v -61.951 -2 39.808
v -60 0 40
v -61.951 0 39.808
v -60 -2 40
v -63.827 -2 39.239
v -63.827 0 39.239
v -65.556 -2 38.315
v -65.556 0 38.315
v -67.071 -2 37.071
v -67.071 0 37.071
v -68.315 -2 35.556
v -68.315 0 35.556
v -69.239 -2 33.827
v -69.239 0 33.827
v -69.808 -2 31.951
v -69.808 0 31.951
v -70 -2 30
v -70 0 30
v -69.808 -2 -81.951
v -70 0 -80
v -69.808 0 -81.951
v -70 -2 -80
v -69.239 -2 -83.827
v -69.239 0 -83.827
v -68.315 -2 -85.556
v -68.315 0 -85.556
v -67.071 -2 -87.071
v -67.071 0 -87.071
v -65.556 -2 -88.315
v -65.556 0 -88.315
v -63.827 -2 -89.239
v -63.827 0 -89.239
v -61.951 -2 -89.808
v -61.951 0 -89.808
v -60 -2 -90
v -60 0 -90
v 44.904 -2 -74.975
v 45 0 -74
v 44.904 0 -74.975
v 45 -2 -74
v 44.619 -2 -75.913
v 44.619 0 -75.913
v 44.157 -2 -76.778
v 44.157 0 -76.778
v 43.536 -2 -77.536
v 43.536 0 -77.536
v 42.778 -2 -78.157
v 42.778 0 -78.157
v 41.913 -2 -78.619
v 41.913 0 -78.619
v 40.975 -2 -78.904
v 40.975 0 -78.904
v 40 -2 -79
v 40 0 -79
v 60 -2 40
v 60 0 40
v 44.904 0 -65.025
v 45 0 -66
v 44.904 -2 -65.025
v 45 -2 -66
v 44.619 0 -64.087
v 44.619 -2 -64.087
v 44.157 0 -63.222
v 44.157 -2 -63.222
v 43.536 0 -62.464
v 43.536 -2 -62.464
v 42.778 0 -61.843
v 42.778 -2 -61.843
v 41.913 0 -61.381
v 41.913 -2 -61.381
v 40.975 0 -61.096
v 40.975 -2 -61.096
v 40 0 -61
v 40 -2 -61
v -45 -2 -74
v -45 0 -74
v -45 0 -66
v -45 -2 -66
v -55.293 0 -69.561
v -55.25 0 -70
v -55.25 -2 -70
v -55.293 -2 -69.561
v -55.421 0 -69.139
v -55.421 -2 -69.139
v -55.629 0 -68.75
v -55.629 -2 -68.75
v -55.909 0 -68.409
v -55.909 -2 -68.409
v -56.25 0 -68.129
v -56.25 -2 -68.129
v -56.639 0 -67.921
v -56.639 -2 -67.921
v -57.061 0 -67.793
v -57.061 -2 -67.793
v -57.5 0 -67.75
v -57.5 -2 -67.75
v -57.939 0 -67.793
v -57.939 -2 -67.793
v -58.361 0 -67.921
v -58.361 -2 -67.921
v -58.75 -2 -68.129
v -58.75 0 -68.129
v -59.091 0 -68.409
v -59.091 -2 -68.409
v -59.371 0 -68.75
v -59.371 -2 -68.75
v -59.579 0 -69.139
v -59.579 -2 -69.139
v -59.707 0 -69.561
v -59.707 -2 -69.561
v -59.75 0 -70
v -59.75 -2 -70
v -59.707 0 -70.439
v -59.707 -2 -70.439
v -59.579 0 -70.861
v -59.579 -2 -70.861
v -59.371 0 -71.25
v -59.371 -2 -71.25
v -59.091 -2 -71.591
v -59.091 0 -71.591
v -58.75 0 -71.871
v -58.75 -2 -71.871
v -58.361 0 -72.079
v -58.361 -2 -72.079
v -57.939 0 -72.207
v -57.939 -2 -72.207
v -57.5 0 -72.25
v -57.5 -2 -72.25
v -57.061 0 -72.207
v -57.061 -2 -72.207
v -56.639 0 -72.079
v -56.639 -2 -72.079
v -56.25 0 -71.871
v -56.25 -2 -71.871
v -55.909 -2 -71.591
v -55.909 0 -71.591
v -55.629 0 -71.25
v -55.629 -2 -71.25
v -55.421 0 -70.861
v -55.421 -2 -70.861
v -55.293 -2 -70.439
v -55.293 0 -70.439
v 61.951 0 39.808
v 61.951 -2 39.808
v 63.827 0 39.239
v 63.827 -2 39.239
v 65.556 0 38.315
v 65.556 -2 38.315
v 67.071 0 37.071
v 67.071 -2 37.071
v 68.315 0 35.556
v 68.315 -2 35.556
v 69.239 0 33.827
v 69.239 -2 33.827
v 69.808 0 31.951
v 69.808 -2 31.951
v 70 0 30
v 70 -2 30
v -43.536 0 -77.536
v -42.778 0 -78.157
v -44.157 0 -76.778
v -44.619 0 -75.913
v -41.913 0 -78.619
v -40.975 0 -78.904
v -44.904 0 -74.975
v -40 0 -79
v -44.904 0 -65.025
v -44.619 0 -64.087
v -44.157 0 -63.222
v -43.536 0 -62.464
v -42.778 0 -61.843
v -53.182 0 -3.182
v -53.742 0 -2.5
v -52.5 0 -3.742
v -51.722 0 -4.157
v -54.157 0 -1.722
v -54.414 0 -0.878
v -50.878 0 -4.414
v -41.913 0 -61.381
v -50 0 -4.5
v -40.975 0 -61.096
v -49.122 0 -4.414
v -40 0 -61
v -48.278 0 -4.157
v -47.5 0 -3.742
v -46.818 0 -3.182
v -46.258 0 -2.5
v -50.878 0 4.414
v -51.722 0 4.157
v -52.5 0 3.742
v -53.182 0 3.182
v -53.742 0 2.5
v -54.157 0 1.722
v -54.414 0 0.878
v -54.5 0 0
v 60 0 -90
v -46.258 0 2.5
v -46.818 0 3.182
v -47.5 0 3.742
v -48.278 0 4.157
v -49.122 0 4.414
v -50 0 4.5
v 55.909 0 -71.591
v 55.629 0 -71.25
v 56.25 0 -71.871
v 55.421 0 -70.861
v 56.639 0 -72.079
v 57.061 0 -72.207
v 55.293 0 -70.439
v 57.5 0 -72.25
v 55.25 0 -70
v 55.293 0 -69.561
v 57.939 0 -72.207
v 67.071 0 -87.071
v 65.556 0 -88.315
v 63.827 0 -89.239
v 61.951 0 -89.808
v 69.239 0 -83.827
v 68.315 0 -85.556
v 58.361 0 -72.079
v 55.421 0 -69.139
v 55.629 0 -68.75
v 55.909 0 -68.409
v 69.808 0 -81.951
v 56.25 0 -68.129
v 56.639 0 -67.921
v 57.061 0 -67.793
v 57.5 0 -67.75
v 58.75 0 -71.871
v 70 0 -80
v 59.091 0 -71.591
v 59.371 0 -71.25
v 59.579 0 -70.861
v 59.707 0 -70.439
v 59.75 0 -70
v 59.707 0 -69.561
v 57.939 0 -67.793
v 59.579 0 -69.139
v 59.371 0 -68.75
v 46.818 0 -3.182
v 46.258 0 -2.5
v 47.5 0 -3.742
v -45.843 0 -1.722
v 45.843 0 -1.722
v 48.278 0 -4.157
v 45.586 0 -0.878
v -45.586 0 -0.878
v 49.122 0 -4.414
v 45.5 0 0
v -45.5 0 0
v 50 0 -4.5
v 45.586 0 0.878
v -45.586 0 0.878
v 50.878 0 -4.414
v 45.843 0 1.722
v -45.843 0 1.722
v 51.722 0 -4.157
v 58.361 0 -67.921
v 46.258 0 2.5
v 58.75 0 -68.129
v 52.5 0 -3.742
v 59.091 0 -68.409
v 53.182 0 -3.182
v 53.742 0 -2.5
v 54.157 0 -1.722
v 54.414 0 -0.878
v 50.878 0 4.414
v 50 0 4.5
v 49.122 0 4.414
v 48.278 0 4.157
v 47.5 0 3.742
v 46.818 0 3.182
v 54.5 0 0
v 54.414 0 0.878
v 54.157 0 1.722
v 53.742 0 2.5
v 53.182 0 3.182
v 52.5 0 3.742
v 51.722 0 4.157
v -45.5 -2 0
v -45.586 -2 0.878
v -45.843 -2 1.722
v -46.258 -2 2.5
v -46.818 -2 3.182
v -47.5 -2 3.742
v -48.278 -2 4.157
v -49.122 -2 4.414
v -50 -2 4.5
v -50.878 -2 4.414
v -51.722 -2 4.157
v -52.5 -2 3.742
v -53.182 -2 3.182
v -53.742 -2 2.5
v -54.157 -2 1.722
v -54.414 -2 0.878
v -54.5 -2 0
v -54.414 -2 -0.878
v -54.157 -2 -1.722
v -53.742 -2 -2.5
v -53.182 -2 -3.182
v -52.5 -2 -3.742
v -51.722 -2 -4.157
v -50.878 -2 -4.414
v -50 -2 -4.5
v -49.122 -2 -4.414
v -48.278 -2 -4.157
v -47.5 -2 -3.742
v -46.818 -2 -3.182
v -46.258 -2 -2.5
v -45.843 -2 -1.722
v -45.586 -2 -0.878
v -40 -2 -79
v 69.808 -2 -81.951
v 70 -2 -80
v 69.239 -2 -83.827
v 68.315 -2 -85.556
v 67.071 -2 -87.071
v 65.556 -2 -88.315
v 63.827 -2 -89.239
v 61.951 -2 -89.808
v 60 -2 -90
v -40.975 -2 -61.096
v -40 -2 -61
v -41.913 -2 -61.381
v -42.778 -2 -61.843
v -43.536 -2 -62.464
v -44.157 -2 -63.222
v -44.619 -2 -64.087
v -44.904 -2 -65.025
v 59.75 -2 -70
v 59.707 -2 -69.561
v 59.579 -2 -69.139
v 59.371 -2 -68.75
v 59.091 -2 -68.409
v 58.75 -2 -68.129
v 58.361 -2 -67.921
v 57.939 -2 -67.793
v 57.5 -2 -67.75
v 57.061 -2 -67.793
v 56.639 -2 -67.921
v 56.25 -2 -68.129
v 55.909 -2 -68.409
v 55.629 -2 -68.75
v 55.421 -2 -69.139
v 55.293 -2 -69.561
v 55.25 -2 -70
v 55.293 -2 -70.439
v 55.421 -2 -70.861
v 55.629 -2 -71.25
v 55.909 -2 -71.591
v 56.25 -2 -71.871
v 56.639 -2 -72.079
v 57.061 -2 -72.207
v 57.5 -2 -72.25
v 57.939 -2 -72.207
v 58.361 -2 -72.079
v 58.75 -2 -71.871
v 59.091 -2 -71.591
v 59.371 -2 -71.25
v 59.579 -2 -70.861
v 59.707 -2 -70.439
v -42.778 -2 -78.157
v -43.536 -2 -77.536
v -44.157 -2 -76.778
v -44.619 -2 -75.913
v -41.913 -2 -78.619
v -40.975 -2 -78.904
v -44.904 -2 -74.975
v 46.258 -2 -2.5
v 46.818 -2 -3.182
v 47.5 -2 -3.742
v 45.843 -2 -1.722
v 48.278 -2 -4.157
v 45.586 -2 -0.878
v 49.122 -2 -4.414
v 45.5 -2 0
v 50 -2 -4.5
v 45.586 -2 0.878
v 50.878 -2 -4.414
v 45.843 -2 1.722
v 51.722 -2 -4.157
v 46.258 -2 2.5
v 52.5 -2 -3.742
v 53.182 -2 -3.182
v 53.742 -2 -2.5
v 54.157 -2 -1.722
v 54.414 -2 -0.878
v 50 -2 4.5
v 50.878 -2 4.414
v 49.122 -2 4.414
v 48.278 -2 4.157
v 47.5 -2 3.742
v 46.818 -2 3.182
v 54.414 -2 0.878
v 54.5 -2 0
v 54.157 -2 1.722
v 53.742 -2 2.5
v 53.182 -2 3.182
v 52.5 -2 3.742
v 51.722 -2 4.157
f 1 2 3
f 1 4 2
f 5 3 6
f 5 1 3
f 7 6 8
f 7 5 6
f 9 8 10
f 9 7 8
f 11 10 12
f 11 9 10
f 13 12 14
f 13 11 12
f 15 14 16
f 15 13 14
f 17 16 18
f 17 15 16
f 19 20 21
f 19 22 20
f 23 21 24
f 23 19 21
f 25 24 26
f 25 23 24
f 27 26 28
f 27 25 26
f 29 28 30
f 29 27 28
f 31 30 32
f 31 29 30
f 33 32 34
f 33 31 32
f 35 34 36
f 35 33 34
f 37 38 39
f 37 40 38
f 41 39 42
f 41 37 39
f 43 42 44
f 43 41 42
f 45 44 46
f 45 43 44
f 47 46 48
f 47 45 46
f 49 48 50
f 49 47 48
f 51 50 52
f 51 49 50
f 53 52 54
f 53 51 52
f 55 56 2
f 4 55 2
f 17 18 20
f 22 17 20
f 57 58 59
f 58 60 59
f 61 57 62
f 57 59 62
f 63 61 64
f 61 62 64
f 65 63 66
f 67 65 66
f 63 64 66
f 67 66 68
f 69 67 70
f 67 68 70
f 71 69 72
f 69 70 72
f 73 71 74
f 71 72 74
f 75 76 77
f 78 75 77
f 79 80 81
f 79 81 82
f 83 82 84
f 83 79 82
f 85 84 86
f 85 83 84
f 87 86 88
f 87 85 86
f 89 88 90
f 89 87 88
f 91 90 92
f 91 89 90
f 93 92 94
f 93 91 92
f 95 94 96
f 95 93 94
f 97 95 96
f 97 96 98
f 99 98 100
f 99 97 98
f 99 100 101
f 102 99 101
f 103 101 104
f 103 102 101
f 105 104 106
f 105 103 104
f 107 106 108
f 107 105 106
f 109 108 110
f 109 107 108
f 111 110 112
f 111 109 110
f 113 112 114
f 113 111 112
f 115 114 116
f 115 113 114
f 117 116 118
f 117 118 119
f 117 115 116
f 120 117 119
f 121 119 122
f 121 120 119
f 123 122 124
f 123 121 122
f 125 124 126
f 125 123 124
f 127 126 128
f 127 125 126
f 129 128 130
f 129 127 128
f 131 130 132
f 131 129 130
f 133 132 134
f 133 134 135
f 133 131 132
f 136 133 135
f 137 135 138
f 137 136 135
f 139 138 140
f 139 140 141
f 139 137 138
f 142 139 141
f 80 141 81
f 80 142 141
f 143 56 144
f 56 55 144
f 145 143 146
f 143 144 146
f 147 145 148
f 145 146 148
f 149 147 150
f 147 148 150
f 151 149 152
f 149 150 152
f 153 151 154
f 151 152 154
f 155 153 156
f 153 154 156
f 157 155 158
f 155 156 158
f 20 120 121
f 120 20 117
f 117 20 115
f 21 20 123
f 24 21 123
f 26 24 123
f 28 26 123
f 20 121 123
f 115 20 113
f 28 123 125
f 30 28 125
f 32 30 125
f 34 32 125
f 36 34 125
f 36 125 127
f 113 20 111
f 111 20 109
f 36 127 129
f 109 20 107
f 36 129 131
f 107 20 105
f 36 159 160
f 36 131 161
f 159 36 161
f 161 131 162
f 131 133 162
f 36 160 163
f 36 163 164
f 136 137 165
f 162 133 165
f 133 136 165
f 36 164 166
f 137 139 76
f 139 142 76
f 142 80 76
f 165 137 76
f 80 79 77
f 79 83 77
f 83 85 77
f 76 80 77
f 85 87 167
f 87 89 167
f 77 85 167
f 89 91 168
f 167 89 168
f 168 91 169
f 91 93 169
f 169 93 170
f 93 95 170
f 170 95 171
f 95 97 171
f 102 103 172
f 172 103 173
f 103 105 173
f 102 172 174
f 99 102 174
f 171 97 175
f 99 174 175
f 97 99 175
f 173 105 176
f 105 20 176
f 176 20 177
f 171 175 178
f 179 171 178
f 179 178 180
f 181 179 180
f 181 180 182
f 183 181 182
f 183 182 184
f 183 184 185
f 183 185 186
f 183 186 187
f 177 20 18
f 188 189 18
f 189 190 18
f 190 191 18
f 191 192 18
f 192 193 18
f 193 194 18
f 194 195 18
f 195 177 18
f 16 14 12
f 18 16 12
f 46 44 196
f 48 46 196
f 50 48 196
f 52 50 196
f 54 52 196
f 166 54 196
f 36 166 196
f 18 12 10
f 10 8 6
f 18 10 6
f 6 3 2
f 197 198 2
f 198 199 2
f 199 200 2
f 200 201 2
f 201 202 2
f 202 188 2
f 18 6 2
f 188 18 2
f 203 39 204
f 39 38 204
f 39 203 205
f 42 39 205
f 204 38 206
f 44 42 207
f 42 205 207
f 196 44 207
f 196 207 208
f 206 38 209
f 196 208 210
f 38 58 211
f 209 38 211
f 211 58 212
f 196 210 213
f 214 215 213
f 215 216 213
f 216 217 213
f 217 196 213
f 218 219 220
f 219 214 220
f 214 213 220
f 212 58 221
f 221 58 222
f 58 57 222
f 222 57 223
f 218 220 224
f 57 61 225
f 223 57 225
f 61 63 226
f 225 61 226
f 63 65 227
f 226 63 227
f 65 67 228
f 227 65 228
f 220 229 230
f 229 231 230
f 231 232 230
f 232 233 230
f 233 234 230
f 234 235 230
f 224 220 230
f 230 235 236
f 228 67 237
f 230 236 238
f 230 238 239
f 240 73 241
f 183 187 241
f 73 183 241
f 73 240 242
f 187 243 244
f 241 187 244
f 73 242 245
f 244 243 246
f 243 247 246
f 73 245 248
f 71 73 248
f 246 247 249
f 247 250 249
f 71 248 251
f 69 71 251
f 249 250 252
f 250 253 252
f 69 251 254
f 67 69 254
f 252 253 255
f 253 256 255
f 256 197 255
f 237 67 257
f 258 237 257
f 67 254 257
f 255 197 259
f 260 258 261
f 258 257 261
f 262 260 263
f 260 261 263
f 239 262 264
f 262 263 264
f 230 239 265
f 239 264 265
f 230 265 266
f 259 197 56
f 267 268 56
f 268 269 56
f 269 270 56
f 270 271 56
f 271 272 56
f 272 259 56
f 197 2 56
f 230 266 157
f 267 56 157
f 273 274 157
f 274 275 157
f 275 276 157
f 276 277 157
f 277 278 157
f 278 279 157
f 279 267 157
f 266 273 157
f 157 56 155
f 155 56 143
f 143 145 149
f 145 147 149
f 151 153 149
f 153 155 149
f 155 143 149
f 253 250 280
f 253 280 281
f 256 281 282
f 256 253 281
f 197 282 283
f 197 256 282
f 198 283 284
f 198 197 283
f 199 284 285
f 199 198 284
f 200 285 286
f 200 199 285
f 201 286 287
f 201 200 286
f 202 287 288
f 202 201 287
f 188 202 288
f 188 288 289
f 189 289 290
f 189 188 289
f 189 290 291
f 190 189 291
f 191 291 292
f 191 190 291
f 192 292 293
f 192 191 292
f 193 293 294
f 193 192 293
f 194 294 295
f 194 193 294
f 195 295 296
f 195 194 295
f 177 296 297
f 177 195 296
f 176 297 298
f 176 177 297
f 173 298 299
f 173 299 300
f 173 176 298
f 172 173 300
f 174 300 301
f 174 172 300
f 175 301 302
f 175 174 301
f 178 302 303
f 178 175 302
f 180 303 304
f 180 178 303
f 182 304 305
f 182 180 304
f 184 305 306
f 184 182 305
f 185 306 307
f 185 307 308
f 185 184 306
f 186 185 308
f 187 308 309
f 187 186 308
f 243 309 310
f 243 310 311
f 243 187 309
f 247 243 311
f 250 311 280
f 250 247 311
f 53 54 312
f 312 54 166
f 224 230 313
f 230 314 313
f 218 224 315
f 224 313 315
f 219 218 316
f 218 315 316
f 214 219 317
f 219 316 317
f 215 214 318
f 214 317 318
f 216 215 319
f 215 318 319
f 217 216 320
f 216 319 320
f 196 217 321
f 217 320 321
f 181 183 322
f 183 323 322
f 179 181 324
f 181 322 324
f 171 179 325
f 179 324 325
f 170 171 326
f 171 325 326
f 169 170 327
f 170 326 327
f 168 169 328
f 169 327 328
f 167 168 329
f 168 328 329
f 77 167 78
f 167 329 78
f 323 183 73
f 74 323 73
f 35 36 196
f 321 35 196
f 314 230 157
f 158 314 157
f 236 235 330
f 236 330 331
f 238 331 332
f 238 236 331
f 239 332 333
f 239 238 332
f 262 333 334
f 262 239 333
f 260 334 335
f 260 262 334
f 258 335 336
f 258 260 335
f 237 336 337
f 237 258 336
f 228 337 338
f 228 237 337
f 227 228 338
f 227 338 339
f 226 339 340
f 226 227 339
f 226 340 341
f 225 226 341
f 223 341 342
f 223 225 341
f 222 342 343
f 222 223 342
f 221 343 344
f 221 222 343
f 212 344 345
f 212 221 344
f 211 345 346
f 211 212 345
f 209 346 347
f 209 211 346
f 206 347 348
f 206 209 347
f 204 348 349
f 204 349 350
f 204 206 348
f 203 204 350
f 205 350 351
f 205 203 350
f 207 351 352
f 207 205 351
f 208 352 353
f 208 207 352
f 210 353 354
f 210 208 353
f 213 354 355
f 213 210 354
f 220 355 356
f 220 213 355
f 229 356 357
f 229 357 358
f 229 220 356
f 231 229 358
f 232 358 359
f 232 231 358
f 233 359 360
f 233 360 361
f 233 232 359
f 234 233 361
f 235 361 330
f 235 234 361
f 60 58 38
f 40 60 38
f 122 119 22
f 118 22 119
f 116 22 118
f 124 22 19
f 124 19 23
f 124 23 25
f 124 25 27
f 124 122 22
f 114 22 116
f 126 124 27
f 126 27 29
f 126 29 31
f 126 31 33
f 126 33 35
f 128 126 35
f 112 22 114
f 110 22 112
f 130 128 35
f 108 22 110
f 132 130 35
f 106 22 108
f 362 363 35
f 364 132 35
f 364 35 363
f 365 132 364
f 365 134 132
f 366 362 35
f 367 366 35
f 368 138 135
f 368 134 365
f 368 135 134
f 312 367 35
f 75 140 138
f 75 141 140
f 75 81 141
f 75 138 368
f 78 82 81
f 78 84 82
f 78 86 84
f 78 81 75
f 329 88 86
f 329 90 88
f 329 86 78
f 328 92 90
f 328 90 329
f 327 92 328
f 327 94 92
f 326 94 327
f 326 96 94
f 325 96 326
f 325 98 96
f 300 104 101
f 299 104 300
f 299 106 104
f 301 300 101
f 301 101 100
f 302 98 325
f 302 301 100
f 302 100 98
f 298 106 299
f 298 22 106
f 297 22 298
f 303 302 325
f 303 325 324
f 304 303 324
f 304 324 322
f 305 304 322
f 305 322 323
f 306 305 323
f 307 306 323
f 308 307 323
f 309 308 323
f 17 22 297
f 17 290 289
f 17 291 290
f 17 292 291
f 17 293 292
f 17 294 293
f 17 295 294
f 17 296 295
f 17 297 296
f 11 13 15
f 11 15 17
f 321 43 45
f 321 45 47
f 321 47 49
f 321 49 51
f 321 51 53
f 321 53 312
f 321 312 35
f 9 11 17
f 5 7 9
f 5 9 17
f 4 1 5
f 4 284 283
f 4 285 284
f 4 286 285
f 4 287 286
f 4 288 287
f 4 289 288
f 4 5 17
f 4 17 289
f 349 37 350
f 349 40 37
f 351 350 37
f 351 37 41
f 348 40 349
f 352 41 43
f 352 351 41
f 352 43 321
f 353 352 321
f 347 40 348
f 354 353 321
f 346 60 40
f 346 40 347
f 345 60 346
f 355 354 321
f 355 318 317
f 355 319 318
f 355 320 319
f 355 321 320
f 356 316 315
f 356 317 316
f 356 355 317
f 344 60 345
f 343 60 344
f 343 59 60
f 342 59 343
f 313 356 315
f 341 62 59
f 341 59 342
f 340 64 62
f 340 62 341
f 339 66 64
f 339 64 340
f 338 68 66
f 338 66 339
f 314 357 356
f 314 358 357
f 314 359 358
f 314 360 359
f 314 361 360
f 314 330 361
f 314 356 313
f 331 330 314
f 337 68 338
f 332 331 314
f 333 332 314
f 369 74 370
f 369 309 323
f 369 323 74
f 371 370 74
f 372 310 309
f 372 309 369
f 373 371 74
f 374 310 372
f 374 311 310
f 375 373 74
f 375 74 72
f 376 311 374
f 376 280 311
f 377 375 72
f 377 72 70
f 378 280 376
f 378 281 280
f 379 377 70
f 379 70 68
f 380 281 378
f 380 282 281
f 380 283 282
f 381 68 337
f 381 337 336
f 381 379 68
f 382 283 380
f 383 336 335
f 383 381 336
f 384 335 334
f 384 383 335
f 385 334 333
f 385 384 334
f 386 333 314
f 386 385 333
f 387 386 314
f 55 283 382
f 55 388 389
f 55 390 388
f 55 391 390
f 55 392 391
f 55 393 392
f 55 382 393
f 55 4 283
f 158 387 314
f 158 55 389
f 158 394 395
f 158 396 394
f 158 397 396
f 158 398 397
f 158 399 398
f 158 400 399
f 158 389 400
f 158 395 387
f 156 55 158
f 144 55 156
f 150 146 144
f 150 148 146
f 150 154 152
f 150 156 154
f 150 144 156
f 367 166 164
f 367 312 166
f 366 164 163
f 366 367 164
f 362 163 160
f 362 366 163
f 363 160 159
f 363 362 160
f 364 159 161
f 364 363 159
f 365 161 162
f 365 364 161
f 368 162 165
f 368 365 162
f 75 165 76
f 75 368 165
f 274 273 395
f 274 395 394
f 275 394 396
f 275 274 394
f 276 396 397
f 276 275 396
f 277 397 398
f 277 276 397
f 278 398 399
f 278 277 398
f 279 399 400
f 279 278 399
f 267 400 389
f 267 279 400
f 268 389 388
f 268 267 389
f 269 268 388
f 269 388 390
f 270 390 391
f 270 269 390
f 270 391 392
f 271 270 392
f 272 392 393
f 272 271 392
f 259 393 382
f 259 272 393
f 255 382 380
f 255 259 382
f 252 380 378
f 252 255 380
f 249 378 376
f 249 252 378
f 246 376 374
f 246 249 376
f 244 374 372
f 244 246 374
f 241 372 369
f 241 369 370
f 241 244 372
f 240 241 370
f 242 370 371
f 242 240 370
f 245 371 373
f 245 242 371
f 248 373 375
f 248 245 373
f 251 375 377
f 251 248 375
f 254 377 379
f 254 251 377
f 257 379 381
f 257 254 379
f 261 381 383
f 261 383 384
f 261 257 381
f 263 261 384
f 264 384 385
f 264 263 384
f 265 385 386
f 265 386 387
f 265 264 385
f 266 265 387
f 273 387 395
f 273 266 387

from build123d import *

# Parameters (mm, degrees)
F0_R     = 2.25
F0_R_2   = 4.5
F1_DEPTH = 2
F2_R     = 10
F3_R     = 5


with BuildPart() as f1:
    # F0 (on Front) → F1 (new body)
    with BuildSketch(Plane.XZ):
        Polygon((70, 40), (0, 40), (0, -61), (45, -61), (45, -79), (0, -79), (0, -90), (70, -90), align=None)
        with Locations((57.5, -70)):
            Circle(F0_R, mode=Mode.SUBTRACT)
        with Locations((50, 0)):
            Circle(F0_R_2, mode=Mode.SUBTRACT)
        Polygon((0, -61), (0, 40), (-70, 40), (-70, -90), (0, -90), (0, -79), (-45, -79), (-45, -61), align=None)
        with Locations((-57.5, -70)):
            Circle(F0_R, mode=Mode.SUBTRACT)
        with Locations((-50, 0)):
            Circle(F0_R_2, mode=Mode.SUBTRACT)
    extrude(amount=F1_DEPTH)

    # F2
    f2_edges = [f1.edges().sort_by_distance(p)[0] for p in [
        (70, -1, 40),
        (-70, -1, 40),
        (70, -1, -90),
        (-70, -1, -90),
    ]]
    fillet(f2_edges, radius=F2_R)

    # F3
    f3_edges = [f1.edges().sort_by_distance(p)[0] for p in [
        (45, -1, -61),
        (45, -1, -79),
        (-45, -1, -79),
        (-45, -1, -61),
    ]]
    fillet(f3_edges, radius=F3_R)


solid = f1.part
